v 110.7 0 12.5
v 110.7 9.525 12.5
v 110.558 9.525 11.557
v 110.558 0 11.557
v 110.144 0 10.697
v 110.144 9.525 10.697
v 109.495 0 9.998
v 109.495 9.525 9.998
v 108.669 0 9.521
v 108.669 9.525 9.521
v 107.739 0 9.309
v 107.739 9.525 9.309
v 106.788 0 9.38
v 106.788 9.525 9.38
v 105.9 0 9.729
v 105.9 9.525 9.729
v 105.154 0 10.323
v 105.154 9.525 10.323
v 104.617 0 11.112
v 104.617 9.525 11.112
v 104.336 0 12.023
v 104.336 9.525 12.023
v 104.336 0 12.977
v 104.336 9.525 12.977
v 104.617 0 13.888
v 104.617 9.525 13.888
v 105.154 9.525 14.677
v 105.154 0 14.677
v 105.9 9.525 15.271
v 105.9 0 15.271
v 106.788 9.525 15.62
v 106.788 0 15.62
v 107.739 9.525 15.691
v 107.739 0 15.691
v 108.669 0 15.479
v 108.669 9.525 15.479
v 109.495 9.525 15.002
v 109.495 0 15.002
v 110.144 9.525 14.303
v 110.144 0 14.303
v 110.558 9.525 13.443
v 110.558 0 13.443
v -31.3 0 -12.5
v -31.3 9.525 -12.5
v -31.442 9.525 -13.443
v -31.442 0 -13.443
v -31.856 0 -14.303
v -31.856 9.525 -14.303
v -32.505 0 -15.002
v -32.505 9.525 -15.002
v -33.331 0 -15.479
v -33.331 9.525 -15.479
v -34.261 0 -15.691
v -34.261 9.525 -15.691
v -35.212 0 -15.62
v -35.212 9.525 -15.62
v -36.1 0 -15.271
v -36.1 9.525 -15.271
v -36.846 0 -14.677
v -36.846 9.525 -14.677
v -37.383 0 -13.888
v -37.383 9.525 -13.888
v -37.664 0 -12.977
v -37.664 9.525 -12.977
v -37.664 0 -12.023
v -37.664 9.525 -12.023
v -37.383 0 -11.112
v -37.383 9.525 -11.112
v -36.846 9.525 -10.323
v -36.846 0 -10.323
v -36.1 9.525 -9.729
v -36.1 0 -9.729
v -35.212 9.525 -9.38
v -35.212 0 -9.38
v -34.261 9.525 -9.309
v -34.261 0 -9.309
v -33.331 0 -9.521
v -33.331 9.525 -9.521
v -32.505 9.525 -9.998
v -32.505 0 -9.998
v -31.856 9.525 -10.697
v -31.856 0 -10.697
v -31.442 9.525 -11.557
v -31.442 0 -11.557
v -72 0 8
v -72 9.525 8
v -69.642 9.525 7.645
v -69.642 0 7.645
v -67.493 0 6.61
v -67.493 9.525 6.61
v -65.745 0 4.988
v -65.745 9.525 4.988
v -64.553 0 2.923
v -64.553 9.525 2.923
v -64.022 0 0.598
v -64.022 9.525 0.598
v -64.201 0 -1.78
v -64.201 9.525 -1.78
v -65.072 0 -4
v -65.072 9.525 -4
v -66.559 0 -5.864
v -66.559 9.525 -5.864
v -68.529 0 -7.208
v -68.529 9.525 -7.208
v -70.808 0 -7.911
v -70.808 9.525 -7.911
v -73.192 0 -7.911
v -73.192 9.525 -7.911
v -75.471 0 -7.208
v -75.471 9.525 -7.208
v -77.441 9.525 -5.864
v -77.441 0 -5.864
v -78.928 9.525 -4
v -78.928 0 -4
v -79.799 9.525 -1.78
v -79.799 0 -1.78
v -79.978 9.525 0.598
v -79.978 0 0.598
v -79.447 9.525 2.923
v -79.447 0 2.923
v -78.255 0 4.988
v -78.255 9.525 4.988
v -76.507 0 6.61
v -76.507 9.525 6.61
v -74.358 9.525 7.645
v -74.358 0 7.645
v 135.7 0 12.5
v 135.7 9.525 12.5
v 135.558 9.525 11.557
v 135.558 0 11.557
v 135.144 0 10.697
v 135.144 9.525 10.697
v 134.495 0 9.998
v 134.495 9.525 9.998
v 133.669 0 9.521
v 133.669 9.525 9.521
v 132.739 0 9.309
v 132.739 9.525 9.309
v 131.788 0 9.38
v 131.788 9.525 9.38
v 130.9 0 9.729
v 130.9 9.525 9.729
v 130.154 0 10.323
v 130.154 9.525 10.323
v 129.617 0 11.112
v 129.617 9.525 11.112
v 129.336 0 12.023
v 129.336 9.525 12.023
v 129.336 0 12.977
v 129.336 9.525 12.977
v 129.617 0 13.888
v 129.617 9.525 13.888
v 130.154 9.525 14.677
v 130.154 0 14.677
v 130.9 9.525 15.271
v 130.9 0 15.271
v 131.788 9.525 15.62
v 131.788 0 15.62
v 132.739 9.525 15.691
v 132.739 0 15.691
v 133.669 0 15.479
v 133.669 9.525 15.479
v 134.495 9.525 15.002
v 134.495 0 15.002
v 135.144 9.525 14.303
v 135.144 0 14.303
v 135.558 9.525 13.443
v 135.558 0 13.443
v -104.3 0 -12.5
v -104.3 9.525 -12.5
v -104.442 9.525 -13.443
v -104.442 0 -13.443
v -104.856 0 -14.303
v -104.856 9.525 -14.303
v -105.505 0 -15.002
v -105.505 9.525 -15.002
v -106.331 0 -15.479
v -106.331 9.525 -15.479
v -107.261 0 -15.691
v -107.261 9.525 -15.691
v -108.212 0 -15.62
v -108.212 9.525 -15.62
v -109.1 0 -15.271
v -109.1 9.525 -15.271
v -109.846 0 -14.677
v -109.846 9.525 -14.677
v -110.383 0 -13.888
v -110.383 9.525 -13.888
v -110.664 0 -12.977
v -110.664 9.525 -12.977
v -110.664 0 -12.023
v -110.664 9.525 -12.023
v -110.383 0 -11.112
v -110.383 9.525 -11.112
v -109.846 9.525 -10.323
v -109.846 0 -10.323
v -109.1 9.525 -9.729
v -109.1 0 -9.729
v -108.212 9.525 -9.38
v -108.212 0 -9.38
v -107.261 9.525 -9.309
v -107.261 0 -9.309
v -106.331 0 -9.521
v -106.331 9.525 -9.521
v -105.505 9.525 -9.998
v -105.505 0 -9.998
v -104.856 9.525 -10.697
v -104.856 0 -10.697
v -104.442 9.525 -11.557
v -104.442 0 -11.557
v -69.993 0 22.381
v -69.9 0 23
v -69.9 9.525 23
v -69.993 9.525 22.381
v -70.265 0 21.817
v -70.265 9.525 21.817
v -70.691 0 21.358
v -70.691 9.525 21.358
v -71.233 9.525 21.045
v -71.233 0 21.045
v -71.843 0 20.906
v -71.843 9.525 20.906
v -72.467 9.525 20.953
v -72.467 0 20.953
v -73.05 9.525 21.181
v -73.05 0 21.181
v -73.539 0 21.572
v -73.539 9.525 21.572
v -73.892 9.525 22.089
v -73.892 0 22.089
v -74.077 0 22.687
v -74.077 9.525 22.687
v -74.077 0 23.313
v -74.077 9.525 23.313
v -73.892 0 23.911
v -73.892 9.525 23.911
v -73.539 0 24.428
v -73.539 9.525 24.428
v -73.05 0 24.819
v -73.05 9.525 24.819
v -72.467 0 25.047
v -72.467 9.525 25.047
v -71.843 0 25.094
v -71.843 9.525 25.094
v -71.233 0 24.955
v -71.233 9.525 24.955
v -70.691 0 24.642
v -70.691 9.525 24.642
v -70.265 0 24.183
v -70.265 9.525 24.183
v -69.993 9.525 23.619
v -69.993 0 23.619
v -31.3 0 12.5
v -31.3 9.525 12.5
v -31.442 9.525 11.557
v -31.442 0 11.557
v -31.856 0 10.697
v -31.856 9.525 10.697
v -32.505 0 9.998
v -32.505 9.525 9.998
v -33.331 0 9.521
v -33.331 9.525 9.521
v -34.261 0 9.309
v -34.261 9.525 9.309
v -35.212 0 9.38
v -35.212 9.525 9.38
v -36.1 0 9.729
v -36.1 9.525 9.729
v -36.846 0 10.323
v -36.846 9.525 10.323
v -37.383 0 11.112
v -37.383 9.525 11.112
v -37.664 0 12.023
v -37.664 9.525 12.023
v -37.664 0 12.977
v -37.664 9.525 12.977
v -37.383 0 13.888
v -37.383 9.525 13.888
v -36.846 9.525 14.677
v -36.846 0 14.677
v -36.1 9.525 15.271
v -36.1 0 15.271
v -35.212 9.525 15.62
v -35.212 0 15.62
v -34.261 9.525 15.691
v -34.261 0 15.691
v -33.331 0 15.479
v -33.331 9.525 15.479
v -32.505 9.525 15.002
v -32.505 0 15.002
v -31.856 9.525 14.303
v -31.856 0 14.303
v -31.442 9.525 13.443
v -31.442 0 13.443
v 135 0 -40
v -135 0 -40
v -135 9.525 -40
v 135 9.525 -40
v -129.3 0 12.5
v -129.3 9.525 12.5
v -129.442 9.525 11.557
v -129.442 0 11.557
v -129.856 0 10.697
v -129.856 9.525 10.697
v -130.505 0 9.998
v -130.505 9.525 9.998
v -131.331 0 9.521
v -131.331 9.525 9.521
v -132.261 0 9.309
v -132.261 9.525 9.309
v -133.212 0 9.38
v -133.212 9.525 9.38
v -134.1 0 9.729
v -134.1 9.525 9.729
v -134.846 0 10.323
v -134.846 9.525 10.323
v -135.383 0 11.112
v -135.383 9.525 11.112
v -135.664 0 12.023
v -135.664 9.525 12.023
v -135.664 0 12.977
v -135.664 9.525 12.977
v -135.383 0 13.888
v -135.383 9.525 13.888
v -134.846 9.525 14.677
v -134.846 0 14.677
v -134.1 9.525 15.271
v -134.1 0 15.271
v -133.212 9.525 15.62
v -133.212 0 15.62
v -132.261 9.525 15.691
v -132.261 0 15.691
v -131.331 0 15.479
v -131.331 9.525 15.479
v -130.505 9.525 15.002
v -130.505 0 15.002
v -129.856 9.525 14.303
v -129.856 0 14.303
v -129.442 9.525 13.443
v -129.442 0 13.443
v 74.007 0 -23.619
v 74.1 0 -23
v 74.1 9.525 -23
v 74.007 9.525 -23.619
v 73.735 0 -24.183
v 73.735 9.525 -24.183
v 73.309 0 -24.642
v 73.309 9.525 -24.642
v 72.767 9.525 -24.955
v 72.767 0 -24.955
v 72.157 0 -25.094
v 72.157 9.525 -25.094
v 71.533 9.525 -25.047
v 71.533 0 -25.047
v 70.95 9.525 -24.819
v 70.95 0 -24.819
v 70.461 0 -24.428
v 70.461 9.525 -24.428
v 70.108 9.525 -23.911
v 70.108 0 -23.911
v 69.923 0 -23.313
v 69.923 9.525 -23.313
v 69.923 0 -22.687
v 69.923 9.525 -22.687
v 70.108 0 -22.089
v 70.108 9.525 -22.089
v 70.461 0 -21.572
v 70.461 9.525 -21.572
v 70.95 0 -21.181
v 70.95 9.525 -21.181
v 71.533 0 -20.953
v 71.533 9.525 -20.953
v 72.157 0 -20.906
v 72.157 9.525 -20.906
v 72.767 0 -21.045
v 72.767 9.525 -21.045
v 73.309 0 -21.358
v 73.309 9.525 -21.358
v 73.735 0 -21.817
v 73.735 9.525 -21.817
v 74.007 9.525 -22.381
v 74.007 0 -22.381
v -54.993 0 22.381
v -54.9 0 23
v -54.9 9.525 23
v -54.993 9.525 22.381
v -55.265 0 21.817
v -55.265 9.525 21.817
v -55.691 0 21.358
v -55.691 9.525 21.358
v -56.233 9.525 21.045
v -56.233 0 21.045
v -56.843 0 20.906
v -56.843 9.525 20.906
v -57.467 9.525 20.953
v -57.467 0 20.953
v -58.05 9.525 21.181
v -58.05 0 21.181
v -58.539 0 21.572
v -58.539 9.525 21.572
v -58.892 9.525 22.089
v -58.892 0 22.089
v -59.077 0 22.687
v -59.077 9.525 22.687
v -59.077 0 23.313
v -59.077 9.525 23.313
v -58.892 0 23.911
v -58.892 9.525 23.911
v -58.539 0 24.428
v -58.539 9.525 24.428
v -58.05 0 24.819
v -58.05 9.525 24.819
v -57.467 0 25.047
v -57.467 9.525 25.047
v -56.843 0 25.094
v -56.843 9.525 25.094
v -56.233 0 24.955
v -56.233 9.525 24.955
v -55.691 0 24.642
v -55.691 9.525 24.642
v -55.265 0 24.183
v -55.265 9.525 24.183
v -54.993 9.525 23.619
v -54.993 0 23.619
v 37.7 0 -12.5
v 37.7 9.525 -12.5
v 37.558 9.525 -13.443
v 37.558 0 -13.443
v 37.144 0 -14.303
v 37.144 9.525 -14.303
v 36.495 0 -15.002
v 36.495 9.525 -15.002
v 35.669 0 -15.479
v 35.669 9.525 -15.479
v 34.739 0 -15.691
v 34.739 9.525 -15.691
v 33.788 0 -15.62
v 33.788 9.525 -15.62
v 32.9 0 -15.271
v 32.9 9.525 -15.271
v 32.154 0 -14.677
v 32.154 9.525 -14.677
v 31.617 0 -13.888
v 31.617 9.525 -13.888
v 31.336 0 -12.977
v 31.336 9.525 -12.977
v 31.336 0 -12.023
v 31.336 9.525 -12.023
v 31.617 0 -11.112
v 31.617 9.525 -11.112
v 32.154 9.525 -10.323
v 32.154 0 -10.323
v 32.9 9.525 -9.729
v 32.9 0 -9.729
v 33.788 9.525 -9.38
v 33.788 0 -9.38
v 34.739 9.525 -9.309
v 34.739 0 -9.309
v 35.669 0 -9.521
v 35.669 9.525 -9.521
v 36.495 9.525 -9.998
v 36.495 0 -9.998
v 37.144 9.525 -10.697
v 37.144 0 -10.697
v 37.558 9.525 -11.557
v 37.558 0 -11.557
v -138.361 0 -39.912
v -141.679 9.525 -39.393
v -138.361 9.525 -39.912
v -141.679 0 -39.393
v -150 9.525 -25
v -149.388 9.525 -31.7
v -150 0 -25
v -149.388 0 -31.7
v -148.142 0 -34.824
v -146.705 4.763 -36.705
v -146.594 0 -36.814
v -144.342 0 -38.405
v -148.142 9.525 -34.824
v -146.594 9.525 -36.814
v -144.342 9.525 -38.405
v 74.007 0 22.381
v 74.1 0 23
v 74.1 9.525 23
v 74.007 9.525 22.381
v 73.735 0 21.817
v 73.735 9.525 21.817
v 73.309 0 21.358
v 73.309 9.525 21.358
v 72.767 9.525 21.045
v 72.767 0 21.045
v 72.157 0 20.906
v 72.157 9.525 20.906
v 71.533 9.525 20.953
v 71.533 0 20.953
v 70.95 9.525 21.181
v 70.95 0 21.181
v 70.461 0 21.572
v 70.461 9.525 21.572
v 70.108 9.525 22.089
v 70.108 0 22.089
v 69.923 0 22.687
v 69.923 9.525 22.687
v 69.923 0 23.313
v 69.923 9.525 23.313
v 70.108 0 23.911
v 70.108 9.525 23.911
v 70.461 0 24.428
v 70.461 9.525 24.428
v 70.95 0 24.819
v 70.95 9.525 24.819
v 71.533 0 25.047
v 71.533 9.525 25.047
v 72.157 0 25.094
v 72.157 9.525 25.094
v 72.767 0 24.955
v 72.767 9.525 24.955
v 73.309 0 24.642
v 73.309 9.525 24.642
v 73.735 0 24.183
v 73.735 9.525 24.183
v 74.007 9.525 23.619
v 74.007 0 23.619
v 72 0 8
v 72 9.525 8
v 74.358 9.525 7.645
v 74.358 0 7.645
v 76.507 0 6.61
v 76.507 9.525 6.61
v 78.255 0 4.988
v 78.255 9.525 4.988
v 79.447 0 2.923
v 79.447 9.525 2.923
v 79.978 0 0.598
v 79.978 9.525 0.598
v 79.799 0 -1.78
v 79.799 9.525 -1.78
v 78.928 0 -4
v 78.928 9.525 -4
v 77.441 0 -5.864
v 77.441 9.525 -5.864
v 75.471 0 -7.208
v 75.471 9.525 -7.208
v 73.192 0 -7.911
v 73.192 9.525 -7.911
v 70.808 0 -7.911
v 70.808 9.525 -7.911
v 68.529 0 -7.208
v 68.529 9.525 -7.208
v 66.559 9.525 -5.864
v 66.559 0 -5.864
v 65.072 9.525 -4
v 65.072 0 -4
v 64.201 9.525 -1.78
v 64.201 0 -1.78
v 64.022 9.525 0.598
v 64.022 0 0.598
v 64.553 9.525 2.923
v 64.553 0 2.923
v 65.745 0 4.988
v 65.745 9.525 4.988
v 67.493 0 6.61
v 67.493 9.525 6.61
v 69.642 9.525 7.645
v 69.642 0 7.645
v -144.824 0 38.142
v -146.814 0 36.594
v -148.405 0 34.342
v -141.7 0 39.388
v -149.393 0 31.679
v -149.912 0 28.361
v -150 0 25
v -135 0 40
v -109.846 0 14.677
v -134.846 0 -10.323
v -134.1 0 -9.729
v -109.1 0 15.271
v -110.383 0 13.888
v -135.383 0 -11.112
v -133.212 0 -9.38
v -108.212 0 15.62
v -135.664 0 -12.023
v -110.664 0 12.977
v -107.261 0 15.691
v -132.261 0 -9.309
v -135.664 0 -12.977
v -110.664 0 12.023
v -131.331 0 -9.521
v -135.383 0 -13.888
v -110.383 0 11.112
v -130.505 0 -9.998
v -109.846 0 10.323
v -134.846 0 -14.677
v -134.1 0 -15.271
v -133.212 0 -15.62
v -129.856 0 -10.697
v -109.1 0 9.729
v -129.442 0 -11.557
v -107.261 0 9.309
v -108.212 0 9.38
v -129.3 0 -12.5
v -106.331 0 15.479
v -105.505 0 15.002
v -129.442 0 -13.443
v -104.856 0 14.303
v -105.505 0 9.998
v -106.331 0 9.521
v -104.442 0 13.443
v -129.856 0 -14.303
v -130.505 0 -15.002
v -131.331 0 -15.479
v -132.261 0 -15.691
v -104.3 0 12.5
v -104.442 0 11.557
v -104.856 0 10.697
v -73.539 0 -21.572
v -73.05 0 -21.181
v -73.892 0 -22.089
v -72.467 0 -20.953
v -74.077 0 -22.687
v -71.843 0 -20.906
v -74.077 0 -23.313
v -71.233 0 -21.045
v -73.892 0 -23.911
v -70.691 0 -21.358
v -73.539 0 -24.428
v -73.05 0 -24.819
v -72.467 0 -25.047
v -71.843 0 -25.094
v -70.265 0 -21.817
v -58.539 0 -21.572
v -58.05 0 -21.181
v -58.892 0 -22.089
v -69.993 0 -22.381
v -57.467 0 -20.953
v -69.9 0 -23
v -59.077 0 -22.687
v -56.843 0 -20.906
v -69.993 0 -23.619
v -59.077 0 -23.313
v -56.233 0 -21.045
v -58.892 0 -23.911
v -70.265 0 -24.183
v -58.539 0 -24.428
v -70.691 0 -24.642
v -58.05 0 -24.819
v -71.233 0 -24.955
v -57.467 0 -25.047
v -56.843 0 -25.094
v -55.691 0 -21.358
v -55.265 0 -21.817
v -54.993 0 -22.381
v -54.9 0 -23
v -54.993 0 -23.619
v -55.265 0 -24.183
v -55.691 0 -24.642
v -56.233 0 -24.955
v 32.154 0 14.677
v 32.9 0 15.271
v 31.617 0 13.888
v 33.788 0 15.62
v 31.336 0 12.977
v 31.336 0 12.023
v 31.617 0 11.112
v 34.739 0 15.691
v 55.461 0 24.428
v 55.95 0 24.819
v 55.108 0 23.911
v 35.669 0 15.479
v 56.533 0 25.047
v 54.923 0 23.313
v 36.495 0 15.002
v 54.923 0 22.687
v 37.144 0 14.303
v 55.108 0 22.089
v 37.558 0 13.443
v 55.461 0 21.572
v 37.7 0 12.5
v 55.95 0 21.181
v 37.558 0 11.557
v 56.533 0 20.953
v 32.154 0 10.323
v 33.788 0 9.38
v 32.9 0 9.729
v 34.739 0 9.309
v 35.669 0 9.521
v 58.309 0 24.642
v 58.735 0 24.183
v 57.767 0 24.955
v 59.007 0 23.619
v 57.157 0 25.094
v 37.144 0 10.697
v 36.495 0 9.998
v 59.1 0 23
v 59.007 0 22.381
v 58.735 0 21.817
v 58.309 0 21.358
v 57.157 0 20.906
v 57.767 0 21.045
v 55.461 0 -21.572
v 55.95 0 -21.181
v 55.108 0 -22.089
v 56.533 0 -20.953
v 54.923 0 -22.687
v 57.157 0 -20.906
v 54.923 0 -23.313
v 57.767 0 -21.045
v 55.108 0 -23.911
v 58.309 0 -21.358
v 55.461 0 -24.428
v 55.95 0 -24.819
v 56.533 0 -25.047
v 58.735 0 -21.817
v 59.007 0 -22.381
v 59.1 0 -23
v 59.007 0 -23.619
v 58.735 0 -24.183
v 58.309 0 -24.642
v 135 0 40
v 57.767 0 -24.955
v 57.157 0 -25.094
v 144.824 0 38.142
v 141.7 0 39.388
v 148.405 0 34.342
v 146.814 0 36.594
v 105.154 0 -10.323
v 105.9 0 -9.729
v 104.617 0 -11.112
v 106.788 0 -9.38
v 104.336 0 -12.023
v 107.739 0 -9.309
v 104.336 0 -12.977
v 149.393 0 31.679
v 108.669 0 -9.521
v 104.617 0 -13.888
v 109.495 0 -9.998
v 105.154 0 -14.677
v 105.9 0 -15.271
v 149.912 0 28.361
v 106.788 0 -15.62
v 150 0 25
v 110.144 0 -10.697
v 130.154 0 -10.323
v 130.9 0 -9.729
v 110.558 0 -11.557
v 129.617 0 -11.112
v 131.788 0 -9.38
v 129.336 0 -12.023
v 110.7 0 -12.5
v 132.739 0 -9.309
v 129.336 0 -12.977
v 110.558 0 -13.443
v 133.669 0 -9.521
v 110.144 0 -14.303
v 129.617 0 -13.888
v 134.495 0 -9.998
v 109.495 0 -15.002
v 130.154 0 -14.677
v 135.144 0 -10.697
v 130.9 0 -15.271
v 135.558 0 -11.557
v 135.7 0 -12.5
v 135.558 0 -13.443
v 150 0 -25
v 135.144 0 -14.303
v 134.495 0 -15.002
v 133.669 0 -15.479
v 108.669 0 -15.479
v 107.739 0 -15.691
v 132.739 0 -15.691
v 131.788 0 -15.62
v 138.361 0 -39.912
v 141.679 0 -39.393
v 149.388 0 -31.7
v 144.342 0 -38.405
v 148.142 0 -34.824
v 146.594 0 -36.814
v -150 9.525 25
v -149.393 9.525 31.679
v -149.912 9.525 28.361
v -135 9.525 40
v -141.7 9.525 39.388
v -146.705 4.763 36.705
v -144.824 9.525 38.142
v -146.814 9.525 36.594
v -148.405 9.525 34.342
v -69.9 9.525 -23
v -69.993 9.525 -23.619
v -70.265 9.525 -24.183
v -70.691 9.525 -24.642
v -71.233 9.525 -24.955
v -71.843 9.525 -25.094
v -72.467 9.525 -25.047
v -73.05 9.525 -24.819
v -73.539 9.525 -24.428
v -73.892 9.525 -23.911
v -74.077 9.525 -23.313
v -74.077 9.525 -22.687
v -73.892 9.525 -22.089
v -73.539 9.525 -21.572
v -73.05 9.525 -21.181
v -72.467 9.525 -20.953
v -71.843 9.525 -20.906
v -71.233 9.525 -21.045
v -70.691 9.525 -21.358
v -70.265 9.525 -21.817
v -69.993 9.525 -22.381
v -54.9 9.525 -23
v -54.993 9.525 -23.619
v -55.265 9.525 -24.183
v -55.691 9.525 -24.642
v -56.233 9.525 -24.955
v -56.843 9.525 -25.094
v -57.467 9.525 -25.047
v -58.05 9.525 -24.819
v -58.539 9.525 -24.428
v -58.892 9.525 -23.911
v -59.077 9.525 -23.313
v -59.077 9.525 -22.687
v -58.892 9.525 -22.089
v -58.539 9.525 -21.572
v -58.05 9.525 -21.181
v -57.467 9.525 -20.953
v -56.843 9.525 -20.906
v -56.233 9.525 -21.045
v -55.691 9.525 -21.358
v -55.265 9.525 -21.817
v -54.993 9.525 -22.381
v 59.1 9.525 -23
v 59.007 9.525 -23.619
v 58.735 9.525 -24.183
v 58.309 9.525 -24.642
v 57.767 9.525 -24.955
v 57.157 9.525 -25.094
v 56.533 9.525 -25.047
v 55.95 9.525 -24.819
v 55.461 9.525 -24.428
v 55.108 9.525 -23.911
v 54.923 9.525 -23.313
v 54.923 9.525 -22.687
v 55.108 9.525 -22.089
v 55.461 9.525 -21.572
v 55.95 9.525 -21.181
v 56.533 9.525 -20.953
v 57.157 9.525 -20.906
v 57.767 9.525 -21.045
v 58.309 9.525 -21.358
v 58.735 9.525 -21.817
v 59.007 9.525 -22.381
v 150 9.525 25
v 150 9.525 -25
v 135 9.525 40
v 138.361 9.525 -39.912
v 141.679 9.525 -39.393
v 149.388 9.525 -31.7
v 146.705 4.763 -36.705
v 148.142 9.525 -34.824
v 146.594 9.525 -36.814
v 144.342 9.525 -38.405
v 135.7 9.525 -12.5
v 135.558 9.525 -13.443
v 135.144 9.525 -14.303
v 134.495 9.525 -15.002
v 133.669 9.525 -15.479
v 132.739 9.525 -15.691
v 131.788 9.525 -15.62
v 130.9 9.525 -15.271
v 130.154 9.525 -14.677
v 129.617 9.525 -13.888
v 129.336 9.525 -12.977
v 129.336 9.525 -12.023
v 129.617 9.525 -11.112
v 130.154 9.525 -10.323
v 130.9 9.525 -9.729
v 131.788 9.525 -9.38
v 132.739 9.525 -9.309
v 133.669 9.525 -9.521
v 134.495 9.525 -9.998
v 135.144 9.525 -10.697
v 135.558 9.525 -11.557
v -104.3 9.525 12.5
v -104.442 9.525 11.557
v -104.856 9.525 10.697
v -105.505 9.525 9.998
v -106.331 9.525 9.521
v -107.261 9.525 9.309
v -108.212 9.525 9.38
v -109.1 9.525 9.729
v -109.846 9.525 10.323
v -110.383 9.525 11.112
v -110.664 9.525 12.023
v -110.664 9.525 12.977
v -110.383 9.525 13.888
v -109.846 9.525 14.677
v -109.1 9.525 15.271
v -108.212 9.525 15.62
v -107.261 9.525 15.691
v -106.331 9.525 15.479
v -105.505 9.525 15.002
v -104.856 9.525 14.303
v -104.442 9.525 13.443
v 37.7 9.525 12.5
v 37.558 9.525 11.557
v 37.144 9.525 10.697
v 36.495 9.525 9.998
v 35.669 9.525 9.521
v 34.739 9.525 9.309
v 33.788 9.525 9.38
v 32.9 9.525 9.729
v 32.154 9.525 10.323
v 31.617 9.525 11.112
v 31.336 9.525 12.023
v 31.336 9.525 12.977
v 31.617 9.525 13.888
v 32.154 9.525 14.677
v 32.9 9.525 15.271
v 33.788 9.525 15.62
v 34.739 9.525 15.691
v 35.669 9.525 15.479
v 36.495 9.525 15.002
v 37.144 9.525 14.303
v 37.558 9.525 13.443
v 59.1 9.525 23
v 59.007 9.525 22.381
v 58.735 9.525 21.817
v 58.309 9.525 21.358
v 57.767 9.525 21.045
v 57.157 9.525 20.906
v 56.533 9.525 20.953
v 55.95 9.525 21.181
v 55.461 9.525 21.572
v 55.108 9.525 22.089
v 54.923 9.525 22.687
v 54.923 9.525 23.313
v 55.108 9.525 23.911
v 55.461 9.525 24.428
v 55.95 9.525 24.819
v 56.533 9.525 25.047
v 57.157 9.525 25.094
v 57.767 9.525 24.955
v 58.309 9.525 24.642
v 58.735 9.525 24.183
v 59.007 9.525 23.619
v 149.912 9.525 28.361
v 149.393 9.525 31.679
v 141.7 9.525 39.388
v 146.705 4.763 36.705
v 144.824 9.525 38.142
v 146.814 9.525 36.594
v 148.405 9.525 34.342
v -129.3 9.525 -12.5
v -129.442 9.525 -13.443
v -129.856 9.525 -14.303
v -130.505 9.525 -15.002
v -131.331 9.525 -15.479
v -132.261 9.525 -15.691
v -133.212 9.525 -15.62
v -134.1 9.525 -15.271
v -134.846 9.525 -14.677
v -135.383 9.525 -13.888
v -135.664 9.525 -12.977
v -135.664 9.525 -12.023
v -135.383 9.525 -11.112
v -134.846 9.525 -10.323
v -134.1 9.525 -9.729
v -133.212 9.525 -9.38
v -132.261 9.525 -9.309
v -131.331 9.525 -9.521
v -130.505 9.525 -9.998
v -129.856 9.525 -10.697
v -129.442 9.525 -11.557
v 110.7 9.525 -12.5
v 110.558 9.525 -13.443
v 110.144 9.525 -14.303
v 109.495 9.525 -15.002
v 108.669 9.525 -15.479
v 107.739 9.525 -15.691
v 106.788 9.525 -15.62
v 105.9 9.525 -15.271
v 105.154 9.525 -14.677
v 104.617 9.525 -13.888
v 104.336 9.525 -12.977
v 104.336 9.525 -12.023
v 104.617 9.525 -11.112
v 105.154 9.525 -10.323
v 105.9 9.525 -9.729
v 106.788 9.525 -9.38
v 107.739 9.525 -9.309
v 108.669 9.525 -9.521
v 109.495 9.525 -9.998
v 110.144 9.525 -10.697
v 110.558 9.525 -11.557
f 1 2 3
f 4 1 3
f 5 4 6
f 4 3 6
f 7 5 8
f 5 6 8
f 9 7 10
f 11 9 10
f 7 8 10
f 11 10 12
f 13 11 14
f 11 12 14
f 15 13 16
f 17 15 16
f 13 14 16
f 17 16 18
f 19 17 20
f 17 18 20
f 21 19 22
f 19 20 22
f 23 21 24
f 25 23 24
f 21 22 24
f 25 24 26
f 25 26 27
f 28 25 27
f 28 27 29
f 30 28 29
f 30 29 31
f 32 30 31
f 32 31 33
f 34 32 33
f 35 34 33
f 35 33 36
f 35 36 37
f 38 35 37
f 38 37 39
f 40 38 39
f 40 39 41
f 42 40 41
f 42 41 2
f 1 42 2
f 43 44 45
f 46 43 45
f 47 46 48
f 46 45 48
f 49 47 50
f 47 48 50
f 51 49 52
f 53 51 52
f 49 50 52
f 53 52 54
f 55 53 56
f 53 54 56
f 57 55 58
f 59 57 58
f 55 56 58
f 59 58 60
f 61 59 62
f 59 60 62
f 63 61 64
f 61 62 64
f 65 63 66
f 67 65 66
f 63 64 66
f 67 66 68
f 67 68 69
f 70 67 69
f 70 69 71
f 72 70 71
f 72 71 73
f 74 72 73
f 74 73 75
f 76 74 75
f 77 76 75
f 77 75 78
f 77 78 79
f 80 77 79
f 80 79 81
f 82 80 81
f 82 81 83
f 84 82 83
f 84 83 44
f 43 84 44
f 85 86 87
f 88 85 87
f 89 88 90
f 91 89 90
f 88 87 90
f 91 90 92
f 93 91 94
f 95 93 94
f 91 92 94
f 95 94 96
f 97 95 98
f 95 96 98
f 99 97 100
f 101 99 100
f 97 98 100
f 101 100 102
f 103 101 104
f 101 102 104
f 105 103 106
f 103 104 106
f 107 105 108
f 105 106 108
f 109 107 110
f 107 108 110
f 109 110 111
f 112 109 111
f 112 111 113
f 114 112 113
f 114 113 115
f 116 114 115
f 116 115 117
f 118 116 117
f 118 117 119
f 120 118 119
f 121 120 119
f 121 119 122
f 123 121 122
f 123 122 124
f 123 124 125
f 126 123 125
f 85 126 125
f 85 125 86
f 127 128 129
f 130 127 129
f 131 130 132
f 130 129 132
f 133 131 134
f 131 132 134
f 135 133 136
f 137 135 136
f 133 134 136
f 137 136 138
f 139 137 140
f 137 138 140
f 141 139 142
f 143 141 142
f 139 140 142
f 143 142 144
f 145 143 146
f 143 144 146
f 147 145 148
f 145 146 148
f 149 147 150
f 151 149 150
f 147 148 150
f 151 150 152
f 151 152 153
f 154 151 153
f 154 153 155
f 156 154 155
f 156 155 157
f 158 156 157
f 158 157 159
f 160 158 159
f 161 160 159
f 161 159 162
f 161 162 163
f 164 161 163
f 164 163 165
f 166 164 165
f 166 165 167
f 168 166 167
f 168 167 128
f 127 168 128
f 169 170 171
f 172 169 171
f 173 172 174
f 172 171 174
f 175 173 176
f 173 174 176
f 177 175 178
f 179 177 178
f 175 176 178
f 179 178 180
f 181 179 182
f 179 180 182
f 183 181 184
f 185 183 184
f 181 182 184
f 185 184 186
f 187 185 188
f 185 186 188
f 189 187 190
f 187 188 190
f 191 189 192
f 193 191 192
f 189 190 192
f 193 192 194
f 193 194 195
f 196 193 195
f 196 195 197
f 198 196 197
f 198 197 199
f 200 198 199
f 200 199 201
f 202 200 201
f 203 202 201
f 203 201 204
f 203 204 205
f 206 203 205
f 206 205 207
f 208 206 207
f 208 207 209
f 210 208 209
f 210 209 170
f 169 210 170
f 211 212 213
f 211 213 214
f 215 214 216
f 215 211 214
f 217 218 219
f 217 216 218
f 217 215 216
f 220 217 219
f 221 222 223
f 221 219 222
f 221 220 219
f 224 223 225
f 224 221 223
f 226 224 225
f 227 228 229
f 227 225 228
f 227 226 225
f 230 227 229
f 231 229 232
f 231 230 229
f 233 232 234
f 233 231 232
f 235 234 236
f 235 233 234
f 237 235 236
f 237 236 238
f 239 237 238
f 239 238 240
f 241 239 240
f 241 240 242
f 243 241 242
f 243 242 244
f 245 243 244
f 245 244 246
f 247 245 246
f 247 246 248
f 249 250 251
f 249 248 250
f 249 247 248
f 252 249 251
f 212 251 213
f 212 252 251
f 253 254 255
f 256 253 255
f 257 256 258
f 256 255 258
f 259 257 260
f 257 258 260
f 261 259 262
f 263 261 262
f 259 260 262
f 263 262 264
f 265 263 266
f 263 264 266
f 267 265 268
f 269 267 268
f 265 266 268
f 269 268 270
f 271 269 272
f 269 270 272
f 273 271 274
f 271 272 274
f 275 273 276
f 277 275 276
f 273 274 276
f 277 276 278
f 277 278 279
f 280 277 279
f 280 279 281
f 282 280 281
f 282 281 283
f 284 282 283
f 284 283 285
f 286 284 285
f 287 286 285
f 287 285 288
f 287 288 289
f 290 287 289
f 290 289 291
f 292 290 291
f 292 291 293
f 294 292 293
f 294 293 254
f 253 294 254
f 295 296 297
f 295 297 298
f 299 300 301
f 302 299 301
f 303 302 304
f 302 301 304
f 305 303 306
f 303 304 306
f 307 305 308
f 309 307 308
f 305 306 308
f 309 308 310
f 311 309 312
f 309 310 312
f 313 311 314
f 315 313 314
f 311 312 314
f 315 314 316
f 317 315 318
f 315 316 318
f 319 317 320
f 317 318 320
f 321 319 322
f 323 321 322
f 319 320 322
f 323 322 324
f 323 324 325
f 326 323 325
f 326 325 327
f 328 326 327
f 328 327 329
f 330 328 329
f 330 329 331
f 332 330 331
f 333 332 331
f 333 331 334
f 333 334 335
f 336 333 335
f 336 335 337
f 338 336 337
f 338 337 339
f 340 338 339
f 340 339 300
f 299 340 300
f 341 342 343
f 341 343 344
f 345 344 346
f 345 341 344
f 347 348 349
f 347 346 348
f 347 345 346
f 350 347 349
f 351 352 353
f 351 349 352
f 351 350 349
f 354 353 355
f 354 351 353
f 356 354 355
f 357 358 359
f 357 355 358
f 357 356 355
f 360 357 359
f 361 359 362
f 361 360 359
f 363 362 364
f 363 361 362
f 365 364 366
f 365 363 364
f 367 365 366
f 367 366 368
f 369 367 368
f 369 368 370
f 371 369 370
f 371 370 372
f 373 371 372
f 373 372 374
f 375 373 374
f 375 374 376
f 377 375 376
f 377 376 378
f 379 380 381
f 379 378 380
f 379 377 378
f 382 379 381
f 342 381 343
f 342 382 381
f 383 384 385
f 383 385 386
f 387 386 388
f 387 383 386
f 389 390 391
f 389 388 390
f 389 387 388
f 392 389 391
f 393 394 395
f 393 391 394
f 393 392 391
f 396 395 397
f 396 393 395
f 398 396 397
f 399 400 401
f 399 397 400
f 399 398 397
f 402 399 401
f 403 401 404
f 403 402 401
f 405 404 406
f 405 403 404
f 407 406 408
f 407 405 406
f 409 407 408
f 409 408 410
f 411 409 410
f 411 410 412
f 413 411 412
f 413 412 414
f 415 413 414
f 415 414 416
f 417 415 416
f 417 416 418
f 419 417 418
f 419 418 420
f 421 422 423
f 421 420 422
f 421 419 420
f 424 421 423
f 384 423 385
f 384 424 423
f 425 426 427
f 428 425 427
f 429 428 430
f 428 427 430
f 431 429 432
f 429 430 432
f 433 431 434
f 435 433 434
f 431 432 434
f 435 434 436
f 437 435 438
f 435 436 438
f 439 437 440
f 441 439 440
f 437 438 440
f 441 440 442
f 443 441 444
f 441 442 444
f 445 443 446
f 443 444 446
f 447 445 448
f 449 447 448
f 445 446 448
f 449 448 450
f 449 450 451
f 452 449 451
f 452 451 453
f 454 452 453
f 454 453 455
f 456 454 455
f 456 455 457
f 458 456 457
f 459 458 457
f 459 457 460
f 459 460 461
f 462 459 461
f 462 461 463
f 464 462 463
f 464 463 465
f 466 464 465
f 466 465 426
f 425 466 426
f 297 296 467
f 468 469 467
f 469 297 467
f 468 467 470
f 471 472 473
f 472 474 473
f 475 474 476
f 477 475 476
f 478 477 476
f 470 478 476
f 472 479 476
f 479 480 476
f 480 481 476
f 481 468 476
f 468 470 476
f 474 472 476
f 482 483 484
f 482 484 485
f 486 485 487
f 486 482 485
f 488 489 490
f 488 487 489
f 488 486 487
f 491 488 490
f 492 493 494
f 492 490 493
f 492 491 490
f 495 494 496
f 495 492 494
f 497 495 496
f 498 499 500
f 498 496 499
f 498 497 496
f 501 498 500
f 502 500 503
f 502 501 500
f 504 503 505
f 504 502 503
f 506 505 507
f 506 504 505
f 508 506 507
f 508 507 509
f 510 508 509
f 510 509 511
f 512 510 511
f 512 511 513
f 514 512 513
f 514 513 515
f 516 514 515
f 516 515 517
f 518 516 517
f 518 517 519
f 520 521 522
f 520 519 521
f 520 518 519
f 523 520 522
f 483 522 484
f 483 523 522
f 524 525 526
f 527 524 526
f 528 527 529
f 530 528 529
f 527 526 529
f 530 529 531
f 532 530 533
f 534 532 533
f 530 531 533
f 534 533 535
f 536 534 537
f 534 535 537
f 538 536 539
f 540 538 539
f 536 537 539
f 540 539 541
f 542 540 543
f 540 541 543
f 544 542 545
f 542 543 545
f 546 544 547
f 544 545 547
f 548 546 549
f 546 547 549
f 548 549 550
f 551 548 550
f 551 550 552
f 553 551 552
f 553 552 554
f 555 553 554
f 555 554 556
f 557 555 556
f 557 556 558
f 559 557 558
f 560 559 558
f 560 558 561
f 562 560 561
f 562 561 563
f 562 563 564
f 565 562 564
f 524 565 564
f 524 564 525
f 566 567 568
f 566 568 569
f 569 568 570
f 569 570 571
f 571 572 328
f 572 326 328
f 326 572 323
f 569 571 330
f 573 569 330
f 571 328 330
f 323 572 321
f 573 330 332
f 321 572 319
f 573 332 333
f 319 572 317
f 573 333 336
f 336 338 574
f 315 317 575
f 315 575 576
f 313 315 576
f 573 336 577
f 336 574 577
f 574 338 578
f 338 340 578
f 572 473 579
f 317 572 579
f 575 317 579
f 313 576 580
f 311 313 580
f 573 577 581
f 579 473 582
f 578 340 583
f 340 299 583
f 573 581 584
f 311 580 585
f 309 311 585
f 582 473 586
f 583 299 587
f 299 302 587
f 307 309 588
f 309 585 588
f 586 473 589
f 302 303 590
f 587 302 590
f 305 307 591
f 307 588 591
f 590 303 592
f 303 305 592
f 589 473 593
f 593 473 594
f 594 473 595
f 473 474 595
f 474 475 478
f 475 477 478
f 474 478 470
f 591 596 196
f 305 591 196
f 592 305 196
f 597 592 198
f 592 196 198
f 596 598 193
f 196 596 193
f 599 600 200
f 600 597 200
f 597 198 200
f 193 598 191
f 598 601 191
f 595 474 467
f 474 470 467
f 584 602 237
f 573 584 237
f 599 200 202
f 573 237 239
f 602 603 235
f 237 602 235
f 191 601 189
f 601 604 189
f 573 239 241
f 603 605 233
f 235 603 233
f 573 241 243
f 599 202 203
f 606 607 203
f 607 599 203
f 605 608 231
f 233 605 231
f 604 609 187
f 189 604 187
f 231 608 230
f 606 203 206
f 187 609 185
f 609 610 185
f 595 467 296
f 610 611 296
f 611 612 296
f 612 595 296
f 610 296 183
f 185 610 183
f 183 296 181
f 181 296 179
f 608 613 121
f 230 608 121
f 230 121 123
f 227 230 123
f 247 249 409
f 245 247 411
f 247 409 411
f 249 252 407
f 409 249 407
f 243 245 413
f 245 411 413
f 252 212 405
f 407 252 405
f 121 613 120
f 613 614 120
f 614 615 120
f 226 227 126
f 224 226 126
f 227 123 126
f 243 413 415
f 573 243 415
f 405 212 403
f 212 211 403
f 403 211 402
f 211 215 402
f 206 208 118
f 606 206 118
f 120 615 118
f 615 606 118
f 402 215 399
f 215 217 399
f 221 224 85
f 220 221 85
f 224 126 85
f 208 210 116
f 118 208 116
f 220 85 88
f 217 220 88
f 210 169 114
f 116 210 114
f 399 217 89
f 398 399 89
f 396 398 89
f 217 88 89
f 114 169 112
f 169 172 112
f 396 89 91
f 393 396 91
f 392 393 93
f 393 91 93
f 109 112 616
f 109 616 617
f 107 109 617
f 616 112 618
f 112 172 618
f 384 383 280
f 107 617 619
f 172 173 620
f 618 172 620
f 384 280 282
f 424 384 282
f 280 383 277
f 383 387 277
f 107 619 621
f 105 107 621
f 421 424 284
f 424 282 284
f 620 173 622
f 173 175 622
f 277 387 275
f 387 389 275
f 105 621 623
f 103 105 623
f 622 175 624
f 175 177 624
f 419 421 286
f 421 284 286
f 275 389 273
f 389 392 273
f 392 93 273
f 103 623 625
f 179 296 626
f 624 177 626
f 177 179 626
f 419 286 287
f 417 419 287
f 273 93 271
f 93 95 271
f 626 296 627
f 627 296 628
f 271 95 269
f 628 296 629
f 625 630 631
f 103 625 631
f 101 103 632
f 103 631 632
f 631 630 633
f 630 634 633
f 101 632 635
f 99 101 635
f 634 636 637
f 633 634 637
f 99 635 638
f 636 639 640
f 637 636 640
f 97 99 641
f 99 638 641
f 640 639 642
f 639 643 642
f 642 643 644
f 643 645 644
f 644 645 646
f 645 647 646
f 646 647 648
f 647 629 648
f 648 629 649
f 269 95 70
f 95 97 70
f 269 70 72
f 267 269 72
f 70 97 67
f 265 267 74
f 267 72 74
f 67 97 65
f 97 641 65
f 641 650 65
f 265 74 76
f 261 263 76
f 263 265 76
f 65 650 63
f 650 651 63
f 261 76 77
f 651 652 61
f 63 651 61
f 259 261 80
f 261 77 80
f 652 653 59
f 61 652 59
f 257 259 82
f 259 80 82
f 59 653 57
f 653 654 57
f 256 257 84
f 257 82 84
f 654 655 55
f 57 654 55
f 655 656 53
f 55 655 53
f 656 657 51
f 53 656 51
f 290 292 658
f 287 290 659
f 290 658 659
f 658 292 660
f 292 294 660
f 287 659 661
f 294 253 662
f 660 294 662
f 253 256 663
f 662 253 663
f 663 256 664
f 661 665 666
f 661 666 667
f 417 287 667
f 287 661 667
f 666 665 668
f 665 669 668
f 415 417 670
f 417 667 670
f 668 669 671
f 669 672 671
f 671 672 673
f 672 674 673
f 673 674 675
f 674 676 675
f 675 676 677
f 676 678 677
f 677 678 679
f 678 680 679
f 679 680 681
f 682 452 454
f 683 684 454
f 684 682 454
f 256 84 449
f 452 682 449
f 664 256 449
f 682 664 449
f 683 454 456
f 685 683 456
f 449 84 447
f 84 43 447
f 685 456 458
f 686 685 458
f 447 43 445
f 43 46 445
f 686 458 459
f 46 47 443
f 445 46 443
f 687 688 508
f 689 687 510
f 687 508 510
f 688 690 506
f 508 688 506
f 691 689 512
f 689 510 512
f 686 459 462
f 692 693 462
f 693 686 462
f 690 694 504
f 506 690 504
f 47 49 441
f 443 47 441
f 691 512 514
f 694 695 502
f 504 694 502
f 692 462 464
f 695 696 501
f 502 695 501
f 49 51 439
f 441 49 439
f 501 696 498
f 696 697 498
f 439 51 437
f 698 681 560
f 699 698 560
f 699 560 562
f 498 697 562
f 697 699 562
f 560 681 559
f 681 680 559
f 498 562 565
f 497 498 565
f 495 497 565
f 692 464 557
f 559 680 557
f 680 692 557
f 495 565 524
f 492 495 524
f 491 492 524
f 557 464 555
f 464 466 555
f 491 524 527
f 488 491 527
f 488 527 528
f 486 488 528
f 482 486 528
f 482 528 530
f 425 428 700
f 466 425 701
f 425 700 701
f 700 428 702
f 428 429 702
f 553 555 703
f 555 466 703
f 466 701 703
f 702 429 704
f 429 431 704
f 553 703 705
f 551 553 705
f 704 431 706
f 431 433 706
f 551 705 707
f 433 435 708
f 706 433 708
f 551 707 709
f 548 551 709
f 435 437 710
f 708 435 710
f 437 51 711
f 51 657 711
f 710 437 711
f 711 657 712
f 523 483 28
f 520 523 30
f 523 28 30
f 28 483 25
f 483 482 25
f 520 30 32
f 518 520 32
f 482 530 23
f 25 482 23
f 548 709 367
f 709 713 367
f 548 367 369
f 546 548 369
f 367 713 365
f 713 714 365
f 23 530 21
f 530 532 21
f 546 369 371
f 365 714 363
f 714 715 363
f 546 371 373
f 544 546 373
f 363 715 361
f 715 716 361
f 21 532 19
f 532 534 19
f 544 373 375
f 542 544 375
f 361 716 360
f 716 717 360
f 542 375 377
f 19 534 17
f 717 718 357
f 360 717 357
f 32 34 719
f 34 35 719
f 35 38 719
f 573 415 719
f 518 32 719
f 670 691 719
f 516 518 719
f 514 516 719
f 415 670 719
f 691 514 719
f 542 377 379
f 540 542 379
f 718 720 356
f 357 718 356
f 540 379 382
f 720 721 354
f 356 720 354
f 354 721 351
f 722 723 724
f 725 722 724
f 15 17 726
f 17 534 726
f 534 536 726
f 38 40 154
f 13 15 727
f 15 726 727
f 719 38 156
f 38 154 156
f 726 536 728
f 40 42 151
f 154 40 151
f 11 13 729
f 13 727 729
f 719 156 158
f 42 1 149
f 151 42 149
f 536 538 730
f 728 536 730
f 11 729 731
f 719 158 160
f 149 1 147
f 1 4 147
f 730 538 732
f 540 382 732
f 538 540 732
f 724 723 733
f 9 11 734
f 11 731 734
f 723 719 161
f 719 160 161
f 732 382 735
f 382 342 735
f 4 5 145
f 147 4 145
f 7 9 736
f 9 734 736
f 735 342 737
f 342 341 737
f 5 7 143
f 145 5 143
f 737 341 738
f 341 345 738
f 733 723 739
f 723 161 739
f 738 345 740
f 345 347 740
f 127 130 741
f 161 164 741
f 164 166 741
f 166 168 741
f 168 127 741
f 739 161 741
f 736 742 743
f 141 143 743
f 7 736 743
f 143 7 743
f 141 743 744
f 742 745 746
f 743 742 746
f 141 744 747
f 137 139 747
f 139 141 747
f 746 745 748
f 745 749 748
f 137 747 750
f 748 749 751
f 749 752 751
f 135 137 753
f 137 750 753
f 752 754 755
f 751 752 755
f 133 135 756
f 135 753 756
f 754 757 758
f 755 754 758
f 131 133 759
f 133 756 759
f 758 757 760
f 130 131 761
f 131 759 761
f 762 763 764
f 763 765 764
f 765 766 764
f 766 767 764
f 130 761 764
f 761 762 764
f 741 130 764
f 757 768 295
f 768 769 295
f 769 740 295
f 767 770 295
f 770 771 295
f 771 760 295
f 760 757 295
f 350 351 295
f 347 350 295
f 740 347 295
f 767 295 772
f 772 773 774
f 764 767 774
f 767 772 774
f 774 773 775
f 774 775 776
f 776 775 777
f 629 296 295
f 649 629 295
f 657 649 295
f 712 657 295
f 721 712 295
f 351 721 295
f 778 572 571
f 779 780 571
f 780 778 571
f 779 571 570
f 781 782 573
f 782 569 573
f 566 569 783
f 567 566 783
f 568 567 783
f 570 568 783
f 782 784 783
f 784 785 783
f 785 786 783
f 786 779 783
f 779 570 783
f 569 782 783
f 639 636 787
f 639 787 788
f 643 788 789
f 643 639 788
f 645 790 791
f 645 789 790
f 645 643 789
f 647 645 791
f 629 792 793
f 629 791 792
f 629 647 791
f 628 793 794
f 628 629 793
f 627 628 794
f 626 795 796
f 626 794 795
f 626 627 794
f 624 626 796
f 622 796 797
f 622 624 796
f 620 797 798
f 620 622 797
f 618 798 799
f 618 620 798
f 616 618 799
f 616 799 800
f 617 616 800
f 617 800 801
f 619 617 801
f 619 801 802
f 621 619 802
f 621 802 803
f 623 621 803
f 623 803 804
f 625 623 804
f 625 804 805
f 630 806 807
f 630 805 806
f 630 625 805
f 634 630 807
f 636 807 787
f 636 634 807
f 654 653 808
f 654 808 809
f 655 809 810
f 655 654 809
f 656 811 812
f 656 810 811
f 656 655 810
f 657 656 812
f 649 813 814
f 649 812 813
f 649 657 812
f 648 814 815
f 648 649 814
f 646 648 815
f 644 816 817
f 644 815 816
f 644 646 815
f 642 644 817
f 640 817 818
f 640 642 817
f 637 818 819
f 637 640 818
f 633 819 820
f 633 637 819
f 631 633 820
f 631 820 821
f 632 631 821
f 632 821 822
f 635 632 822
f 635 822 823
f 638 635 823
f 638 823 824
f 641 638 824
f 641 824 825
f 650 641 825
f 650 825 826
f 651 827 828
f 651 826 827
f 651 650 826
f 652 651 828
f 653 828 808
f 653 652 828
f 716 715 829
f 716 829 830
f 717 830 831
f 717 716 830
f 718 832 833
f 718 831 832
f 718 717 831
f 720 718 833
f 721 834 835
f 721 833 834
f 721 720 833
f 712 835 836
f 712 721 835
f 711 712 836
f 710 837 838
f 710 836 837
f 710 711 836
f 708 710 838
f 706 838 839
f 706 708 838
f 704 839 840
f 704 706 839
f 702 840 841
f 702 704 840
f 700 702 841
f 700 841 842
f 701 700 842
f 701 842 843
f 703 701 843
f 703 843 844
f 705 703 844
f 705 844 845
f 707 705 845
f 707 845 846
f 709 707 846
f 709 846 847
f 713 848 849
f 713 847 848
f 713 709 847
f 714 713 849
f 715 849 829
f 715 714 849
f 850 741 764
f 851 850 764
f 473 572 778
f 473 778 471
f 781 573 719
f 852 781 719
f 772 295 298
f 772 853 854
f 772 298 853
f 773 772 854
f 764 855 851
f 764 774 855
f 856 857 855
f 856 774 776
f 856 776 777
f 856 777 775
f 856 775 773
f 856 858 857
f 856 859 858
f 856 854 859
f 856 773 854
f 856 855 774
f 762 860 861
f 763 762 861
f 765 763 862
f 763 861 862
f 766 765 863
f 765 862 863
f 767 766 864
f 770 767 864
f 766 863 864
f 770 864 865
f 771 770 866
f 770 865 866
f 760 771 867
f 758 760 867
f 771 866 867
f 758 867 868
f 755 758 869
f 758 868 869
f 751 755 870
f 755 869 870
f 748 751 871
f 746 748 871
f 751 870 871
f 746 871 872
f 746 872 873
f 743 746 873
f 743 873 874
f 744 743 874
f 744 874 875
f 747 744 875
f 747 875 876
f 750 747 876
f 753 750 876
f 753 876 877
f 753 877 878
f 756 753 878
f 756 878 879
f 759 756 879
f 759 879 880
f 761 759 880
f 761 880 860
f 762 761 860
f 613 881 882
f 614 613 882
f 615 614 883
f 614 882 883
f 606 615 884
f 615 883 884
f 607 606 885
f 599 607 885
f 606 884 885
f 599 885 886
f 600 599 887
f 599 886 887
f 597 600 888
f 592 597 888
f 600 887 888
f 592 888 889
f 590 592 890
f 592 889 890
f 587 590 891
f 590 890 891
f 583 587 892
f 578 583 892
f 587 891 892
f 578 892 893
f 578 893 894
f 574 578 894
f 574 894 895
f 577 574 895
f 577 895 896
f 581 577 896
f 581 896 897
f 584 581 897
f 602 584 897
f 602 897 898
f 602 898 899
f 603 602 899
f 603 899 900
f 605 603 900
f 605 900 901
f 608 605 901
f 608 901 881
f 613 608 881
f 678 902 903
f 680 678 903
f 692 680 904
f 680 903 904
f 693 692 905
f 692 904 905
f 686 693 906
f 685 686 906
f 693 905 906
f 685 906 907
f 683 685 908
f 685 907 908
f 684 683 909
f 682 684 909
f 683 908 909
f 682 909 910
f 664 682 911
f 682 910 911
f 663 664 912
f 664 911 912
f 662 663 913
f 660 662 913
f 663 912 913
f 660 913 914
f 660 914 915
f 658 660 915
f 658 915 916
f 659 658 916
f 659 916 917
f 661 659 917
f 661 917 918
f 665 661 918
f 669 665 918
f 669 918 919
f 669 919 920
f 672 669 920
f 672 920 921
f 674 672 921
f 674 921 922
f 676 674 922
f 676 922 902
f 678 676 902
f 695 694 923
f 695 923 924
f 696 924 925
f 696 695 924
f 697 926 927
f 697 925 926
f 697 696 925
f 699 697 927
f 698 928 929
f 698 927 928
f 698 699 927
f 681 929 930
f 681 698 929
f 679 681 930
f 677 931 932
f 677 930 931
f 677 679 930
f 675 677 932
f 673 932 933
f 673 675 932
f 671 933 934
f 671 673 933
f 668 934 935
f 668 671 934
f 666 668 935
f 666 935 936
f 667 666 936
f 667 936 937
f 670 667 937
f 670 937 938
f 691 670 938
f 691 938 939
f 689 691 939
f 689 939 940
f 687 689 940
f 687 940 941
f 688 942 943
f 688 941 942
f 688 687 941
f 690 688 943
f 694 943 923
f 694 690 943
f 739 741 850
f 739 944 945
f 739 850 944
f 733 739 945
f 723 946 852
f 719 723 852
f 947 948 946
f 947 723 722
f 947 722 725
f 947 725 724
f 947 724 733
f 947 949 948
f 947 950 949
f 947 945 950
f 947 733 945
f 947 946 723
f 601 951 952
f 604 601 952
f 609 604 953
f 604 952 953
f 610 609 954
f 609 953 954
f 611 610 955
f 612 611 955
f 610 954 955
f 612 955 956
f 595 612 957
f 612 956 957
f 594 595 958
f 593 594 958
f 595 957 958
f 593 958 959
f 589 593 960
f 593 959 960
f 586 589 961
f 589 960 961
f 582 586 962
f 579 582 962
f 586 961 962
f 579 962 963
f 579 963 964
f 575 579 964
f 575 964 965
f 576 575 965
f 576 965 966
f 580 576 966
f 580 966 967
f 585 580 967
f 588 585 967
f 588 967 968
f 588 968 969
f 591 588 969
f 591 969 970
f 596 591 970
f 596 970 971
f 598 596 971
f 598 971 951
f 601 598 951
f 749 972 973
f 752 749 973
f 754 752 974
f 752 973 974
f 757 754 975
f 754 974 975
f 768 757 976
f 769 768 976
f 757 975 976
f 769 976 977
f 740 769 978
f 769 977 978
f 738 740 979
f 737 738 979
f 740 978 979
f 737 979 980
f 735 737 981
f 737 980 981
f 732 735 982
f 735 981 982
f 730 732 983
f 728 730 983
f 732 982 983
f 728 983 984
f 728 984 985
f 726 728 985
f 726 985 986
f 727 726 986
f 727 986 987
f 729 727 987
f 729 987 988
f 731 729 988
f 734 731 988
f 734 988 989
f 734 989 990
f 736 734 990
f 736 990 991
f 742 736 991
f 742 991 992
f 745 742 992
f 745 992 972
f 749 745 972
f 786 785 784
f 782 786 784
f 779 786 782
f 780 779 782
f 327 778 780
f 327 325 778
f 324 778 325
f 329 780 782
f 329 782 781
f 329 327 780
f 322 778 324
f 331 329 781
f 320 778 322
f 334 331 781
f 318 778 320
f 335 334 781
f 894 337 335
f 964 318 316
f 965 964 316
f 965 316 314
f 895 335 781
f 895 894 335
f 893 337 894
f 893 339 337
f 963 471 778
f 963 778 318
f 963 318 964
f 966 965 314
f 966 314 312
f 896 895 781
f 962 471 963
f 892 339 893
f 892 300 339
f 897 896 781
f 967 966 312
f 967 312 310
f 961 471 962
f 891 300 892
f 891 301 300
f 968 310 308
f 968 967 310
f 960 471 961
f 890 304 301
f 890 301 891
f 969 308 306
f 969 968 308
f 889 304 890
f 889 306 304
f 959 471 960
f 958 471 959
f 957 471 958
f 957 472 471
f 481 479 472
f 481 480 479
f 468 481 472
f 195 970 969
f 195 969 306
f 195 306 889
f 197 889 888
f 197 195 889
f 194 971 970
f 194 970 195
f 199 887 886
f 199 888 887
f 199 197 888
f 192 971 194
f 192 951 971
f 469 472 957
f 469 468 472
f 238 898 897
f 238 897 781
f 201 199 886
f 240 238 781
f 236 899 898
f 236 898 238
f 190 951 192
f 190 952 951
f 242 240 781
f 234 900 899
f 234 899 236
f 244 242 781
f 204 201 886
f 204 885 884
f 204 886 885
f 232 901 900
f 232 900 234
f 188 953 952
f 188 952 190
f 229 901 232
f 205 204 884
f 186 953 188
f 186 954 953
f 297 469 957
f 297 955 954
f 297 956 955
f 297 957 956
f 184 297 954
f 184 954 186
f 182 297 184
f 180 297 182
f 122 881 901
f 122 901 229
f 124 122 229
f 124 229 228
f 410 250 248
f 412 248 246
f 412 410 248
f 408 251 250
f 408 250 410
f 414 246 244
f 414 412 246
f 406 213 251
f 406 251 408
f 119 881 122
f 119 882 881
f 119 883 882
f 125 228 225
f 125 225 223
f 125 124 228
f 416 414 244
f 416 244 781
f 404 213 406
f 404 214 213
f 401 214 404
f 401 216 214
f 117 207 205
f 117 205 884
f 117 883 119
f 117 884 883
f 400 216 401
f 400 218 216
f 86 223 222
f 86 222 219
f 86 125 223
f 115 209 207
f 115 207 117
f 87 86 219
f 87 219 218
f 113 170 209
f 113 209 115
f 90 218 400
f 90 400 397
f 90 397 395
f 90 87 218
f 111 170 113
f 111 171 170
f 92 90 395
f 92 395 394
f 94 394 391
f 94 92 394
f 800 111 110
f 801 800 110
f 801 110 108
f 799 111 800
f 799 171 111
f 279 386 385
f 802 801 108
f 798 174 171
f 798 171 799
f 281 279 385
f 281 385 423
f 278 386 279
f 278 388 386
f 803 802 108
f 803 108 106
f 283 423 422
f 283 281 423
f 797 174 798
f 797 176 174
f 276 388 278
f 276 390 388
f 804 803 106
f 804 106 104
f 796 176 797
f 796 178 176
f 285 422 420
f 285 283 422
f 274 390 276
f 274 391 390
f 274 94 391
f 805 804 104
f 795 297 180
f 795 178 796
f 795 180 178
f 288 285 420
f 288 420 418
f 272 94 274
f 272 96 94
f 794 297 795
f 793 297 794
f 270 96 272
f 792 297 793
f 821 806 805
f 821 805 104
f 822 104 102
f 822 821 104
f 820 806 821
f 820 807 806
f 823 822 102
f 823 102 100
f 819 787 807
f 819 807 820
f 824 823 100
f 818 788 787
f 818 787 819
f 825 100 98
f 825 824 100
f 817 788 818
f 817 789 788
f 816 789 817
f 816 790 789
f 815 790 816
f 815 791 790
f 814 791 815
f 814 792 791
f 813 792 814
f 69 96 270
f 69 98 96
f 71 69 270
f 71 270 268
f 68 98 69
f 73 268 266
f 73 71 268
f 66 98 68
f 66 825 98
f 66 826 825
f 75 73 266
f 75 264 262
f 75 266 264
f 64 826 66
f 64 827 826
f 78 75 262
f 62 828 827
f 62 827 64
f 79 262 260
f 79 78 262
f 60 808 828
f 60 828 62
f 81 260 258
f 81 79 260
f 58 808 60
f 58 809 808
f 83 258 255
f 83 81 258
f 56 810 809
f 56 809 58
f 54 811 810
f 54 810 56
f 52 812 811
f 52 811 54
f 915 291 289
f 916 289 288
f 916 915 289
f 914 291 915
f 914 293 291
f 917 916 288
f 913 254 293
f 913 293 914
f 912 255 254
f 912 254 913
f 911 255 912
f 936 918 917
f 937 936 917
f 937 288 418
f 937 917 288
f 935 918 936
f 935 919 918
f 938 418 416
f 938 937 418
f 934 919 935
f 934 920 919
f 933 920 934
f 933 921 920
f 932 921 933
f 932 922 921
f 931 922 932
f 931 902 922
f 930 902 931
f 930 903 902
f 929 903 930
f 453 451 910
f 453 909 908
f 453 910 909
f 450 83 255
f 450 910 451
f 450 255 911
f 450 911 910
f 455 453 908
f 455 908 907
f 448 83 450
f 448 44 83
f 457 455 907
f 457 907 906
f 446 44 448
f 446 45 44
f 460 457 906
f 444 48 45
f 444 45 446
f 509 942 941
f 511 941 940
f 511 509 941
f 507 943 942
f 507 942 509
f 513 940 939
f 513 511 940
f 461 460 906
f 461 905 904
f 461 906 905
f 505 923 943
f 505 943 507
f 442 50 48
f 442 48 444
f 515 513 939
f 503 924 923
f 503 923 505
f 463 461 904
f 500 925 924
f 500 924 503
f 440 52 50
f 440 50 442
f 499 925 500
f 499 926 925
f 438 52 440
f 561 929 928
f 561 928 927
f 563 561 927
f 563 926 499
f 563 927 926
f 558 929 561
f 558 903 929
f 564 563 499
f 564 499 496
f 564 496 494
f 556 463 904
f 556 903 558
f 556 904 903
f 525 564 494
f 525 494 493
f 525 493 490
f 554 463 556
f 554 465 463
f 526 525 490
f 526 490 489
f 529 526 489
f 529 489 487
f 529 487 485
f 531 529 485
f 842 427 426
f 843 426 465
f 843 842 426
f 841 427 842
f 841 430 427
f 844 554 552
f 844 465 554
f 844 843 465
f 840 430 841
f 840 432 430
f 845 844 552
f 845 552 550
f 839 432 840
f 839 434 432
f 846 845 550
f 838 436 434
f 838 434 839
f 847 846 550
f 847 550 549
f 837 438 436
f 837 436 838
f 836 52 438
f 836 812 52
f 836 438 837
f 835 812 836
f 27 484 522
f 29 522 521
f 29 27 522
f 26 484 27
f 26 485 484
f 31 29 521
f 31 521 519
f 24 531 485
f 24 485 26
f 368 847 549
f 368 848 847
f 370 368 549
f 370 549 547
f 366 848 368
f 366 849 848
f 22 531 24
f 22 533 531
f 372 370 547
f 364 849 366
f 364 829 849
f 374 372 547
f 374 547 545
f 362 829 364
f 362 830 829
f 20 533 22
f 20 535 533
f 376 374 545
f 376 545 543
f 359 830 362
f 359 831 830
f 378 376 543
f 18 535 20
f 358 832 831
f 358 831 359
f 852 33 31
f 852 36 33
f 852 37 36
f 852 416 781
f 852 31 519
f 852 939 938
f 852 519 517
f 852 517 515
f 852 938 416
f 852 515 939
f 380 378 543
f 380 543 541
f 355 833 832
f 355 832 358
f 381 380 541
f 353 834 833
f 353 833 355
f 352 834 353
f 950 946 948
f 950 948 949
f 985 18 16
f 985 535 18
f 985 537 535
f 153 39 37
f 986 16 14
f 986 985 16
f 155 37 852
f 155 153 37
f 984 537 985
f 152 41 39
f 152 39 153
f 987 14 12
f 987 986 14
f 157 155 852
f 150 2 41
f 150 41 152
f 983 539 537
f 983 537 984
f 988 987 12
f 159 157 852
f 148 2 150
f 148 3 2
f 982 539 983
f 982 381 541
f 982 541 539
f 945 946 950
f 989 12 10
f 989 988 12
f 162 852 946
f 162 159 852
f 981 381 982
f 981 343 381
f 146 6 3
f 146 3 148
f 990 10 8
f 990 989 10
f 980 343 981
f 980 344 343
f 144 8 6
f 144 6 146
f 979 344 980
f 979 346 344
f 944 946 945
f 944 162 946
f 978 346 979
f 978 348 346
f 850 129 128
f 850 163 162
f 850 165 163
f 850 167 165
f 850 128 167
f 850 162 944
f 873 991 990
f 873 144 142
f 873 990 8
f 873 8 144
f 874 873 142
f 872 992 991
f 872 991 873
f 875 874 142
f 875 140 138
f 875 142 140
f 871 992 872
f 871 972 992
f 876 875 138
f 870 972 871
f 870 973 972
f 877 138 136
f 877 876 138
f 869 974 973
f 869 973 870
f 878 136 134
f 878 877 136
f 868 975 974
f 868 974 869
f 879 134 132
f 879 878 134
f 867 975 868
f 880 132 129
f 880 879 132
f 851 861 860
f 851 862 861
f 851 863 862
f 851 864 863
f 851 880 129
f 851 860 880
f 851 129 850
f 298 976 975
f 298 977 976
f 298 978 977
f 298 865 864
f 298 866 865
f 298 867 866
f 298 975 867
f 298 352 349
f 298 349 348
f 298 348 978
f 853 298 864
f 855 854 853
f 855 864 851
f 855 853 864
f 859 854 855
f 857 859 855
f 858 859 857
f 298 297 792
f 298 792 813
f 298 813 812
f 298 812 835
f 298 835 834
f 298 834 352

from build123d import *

# Parameters (mm, degrees)
SKETCH1_W                     = 300
SKETCH1_H                     = 80
BOSS_EXTRUDE1_DEPTH           = 9.525
SKETCH5_R                     = 8
CUT_EXTRUDE1_DEPTH            = 156.533680034
FILLET1_SIZE                  = 15
M5X0_8_START                  = -1
M5X0_8_TAPPED_HOLE1_OUTLINE_R = 2.1
M5X0_8_TAPPED_HOLE1_DEPTH     = 12
M6_CLEARANCE_HOLE1_D          = 6.4


with BuildPart() as part:
    # Sketch1 → Boss-Extrude1 (new body)
    with BuildSketch(Plane(origin=(0, 0, 0), x_dir=(1, 0, 0), z_dir=(0, 1, 0))):
        Rectangle(SKETCH1_W, SKETCH1_H)
    extrude(amount=BOSS_EXTRUDE1_DEPTH)

    # Sketch5 → Cut-Extrude1 (cut, through all)
    with BuildSketch(Plane(origin=(0, 9.525, 0), x_dir=(1, 0, 0), z_dir=(0, 1, 0))):
        with Locations(Location((-72, 0, 0), (0, 0, 270))):
            Circle(SKETCH5_R)
        with Locations(Location((72, 0, 0), (0, 0, 270))):
            Circle(SKETCH5_R)
    extrude(amount=-CUT_EXTRUDE1_DEPTH, mode=Mode.SUBTRACT)

    # Fillet1
    # a fillet whose section is not a circle: 15 mm, written as the material it takes off along each edge
    with BuildSketch(Plane(origin=(150, -37.5, 40), x_dir=(0, 0, -1), z_dir=(0, 1, 0)), Plane(origin=(150, -37.5, -40), x_dir=(-1, 0, 0), z_dir=(0, 1, 0))) as fillet1_piece_1:
        with BuildLine():
            add(Edge.make_bspline([(FILLET1_SIZE, 0), (FILLET1_SIZE * 0.831801948466, 0), (FILLET1_SIZE * 0.663603896932, 0), (FILLET1_SIZE * 0.292893218813, FILLET1_SIZE * 0.0716919198361), (FILLET1_SIZE * 0.0716919198361, FILLET1_SIZE * 0.292893218813), (0, FILLET1_SIZE * 0.663603896932), (0, FILLET1_SIZE * 0.831801948466), (0, FILLET1_SIZE)], knots=[0, 0, 0, 0, 0, 0, 0.5, 0.5, 1, 1, 1, 1, 1, 1], degree=5))
            Line((0, FILLET1_SIZE), (0, 0))
            Line((0, 0), (FILLET1_SIZE, 0))
        make_face()
    extrude(amount=84.525, mode=Mode.SUBTRACT)
    with BuildSketch(Plane(origin=(-150, -37.5, -40), x_dir=(1, 0, 0), z_dir=(0, 1, 0)), Plane(origin=(-150, -37.5, 40), x_dir=(0, 0, -1), z_dir=(0, 1, 0))) as fillet1_piece_2:
        with BuildLine():
            add(Edge.make_bspline([(FILLET1_SIZE, 0), (FILLET1_SIZE * 0.831801948466, 0), (FILLET1_SIZE * 0.663603896932, 0), (FILLET1_SIZE * 0.292893218813, -FILLET1_SIZE * 0.0716919198361), (FILLET1_SIZE * 0.0716919198361, -FILLET1_SIZE * 0.292893218813), (0, -FILLET1_SIZE * 0.663603896932), (0, -FILLET1_SIZE * 0.831801948466), (0, -FILLET1_SIZE)], knots=[0, 0, 0, 0, 0, 0, 0.5, 0.5, 1, 1, 1, 1, 1, 1], degree=5))
            Line((0, -FILLET1_SIZE), (0, 0))
            Line((0, 0), (FILLET1_SIZE, 0))
        make_face()
    extrude(amount=84.525, mode=Mode.SUBTRACT)

    # M5x0.8 Tapped Hole1: read off the stored shape, not the designer's step
    # M5x0.8 Tapped Hole1 outline → M5x0.8 Tapped Hole1 (cut)
    with BuildSketch(Plane(origin=(0, 0, 0), x_dir=(1, 0, 0), z_dir=(0, 1, 0)).offset(M5X0_8_START)):
        with Locations((57, 23)):
            Circle(M5X0_8_TAPPED_HOLE1_OUTLINE_R)
        with Locations((72, -23)):
            Circle(M5X0_8_TAPPED_HOLE1_OUTLINE_R)
        with Locations((57, -23)):
            Circle(M5X0_8_TAPPED_HOLE1_OUTLINE_R)
        with Locations((72, 23)):
            Circle(M5X0_8_TAPPED_HOLE1_OUTLINE_R)
        with Locations((-57, -23)):
            Circle(M5X0_8_TAPPED_HOLE1_OUTLINE_R)
        with Locations((-72, 23)):
            Circle(M5X0_8_TAPPED_HOLE1_OUTLINE_R)
        with Locations((-57, 23)):
            Circle(M5X0_8_TAPPED_HOLE1_OUTLINE_R)
        with Locations((-72, -23)):
            Circle(M5X0_8_TAPPED_HOLE1_OUTLINE_R)
    extrude(amount=M5X0_8_TAPPED_HOLE1_DEPTH, mode=Mode.SUBTRACT)

    # M6 Clearance Hole1 (through all)
    with Locations(Plane(origin=(0, 0, 0), x_dir=(-1, 0, 0), z_dir=(0, -1, 0))):
        with Locations((132.5, -12.5), (107.5, -12.5), (132.5, 12.5), (107.5, 12.5), (-107.5, -12.5), (-107.5, 12.5), (-132.5, -12.5), (-132.5, 12.5), (34.5, -12.5), (34.5, 12.5), (-34.5, -12.5), (-34.5, 12.5)):
            Hole(M6_CLEARANCE_HOLE1_D / 2)


solid = part.part
